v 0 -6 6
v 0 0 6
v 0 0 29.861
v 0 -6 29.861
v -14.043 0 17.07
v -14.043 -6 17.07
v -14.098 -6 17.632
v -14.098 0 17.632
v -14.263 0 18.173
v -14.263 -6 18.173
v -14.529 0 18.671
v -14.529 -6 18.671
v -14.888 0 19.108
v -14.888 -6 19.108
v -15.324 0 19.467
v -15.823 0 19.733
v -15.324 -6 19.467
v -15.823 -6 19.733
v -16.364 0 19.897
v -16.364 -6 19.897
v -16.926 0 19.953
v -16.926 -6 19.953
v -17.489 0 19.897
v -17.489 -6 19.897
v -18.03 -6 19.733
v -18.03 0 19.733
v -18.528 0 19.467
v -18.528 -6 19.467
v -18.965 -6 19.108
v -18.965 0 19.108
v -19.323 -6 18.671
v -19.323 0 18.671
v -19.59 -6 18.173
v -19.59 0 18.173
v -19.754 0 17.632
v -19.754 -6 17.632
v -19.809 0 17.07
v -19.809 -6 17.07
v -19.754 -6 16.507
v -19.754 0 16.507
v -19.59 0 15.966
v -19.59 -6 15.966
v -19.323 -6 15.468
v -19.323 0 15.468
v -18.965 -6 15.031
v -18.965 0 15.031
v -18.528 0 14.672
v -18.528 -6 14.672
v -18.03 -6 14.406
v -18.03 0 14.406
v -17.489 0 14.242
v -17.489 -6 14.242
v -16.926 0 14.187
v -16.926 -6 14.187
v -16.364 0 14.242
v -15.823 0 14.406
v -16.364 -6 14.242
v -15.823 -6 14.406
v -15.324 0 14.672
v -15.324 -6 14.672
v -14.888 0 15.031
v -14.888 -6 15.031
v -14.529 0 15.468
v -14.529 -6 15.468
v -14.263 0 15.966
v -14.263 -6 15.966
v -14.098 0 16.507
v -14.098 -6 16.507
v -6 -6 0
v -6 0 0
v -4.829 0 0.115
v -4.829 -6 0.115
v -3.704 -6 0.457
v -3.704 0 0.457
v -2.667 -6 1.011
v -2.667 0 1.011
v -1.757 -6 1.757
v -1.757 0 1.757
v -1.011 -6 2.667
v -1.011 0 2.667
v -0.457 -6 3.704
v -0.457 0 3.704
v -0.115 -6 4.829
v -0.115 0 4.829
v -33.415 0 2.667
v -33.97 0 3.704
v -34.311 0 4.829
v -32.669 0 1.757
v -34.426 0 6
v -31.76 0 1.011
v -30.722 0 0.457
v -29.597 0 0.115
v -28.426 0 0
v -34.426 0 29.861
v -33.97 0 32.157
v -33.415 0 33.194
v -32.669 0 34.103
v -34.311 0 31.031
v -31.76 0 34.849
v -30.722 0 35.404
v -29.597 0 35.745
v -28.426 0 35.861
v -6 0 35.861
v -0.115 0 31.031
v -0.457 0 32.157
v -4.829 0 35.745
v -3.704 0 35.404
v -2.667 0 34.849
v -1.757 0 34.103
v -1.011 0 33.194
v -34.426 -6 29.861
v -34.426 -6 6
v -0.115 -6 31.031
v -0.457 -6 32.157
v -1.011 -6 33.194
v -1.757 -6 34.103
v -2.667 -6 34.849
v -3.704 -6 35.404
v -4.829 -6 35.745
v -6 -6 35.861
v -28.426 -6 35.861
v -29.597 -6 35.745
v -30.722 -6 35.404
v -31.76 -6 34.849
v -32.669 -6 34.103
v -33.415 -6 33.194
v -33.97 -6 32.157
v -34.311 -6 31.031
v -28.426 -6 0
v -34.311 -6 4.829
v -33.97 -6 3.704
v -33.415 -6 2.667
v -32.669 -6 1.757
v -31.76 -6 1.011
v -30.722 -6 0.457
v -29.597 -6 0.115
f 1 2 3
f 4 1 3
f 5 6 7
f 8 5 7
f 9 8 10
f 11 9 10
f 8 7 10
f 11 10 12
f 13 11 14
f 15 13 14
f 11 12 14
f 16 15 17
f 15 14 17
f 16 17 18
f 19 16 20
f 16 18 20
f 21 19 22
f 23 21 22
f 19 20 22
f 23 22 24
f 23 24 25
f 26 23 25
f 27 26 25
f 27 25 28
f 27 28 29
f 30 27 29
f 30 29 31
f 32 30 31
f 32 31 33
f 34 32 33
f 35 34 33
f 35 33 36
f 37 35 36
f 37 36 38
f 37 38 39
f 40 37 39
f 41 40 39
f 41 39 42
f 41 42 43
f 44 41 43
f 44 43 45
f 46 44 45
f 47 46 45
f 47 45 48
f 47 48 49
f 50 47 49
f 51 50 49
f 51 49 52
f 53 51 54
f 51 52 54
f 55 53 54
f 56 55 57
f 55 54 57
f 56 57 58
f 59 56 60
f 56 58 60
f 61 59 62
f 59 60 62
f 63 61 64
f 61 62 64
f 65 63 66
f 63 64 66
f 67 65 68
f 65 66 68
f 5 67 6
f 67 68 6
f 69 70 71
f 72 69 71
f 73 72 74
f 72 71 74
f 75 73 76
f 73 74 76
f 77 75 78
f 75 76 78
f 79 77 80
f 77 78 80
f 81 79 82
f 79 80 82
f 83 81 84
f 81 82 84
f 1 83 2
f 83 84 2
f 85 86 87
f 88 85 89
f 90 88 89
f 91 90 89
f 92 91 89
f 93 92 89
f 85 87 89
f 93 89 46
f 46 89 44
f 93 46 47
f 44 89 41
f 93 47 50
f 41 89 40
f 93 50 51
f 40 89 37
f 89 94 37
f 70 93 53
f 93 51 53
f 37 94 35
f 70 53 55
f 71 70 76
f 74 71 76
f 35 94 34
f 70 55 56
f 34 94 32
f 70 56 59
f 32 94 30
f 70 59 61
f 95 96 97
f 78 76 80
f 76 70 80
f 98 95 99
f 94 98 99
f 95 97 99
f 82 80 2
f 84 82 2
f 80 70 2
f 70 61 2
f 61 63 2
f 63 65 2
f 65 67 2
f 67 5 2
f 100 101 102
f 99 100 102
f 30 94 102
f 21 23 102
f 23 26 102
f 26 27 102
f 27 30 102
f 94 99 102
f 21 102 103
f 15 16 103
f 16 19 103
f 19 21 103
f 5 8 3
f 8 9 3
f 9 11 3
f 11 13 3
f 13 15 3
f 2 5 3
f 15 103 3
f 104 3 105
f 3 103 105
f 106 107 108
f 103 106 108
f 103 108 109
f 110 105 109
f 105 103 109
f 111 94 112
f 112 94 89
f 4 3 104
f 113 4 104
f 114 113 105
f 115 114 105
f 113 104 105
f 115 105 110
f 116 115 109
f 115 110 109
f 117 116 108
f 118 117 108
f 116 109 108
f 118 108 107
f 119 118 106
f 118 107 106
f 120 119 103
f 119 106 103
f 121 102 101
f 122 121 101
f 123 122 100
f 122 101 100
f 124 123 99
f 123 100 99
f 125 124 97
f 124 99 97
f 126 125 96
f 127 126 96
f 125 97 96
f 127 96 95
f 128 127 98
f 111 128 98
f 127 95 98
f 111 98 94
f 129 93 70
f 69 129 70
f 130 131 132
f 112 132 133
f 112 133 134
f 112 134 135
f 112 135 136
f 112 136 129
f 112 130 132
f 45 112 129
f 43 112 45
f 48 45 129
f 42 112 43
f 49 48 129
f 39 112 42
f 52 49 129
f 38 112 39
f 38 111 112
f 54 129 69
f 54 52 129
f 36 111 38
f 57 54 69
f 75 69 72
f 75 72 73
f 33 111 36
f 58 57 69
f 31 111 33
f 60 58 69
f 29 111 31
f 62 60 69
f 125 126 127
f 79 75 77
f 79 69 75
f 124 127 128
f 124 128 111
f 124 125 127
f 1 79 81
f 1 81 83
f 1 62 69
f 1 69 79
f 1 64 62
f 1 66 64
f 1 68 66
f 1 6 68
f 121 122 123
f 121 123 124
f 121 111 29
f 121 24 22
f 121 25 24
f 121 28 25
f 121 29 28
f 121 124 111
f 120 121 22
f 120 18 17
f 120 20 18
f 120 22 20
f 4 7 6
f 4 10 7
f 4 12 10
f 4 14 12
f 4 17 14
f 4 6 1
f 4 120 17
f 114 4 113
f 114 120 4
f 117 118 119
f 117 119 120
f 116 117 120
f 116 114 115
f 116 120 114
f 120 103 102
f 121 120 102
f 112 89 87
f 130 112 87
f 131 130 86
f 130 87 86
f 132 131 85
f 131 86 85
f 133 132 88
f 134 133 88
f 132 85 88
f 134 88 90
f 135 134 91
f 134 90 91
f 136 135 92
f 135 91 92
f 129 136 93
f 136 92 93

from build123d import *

# Parameters (mm, degrees)
F1_DEPTH = 6
F2_R     = 2.883162
F3_DEPTH = 30


with BuildPart() as f1:
    # F0 (on Front) → F1 (new body)
    with BuildSketch(Plane.XZ):
        with BuildLine():
            Line((-28.426227, 0), (-6, 0))
            ThreePointArc((-6, 0), (-1.757359, 1.757359), (0, 6))
            Line((0, 6), (0, 29.860658))
            ThreePointArc((0, 29.860658), (-1.757359, 34.103298), (-6, 35.860658))
            Line((-6, 35.860658), (-28.426227, 35.860658))
            ThreePointArc((-28.426227, 35.860658), (-32.668868, 34.103298), (-34.426227, 29.860658))
            Line((-34.426227, 29.860658), (-34.426227, 6))
            ThreePointArc((-34.426227, 6), (-32.668868, 1.757359), (-28.426227, 0))
        make_face()
    extrude(amount=F1_DEPTH)

    # F2 (on face) → F3 (cut)
    with BuildSketch(Plane.XZ.offset(6)):
        with Locations((-16.926229, 17.069673)):
            Circle(F2_R)
    extrude(amount=-F3_DEPTH, mode=Mode.SUBTRACT)


solid = f1.part
